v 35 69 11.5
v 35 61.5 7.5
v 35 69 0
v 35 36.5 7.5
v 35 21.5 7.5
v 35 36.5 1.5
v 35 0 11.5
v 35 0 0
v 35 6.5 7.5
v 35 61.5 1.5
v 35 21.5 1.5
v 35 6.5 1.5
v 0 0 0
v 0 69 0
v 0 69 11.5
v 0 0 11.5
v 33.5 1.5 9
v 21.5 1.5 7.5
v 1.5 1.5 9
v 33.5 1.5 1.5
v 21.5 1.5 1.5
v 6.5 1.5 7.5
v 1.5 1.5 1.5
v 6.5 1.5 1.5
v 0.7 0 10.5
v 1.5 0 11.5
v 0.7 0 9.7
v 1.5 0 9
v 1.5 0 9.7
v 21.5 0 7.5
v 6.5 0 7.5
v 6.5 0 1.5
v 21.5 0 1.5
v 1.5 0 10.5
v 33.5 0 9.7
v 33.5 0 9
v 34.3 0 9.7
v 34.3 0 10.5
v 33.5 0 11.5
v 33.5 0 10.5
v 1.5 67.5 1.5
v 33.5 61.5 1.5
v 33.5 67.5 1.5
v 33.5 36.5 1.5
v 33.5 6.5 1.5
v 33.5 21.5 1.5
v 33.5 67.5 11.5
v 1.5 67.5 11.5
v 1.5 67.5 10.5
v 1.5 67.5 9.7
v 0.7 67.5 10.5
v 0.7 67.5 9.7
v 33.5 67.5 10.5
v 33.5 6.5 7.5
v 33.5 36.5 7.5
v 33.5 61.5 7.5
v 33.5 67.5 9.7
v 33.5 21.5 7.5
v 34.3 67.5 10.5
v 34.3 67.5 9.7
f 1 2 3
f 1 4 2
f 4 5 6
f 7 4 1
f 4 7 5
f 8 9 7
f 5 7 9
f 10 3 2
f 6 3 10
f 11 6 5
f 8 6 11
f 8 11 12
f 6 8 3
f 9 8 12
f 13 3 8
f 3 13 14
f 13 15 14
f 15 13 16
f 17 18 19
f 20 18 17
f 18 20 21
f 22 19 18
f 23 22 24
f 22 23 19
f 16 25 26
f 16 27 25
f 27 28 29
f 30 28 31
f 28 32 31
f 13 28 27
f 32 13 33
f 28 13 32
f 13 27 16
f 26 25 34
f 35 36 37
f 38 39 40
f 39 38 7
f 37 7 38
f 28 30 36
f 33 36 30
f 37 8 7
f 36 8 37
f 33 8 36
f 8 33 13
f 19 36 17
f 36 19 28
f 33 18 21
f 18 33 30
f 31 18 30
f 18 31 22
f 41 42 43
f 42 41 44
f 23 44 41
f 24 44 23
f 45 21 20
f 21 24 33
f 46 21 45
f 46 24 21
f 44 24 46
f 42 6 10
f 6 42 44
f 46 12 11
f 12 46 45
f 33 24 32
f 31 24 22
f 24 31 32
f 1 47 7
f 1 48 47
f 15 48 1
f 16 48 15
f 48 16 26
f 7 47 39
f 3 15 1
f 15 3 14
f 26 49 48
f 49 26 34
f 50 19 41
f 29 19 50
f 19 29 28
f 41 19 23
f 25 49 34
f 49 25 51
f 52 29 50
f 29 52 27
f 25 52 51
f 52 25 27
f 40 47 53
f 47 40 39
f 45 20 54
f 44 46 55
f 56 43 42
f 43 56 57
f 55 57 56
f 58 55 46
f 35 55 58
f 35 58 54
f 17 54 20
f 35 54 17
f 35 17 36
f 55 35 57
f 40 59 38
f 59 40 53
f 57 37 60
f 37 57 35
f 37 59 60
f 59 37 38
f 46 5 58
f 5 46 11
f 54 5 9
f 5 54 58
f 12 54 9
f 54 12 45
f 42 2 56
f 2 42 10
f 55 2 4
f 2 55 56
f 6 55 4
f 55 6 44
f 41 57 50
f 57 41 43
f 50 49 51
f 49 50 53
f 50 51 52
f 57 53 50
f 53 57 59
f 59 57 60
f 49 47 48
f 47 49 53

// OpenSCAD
l=66;
w=32;
h=10;
t=1.5;

slot=0.8;
trim=2.5;

module cutout(x,z,len,height)
{
    translate([x+t,-t,z+t]){
        cube([len,3*t,height]);
    }
}

// Bottom
cube([w+2*t,l+2*t,t]);


// Front
translate([0,0,0]){
    rotate([0,0,0]){ 
        difference(){
           cube([w+2*t,t,h+t]);
            
           translate([0,-t,h+t-trim]){
               cube([w*2*t,3*t,trim]);
           }
           cutout(5,0,15,6);
        }
    }
}

// Back
translate([w+2*t,l+2*t,0]){
    rotate([0,0,180]){
        difference(){
           cube([w+2*t,t,h+t]);
            
            //cutout(0,0,2,2);
        }
    }
}

// Left
translate([0,l+2*t,0]){
    rotate([0,0,-90]){ 
        difference() {
           cube([l+2*t,t,h+t]);
           translate([0,t-slot,h+t-slot-1]){
               cube([l+2*t,slot+.2,slot]);
           }
            //cutout(40,0,25,6);
        }
    }
}

// Right
translate([w+2*t,0,0]){
    rotate([0,0,90]){
        difference(){ 
           cube([l+2*t,t,h+t]);
            
            translate([0,t-slot,h+t-slot-1]){
               cube([l+2*t,slot+0.2,slot]);
           }
            cutout(5,0,15,6);
            cutout(35,0,25,6);
            
        }
    }
}
